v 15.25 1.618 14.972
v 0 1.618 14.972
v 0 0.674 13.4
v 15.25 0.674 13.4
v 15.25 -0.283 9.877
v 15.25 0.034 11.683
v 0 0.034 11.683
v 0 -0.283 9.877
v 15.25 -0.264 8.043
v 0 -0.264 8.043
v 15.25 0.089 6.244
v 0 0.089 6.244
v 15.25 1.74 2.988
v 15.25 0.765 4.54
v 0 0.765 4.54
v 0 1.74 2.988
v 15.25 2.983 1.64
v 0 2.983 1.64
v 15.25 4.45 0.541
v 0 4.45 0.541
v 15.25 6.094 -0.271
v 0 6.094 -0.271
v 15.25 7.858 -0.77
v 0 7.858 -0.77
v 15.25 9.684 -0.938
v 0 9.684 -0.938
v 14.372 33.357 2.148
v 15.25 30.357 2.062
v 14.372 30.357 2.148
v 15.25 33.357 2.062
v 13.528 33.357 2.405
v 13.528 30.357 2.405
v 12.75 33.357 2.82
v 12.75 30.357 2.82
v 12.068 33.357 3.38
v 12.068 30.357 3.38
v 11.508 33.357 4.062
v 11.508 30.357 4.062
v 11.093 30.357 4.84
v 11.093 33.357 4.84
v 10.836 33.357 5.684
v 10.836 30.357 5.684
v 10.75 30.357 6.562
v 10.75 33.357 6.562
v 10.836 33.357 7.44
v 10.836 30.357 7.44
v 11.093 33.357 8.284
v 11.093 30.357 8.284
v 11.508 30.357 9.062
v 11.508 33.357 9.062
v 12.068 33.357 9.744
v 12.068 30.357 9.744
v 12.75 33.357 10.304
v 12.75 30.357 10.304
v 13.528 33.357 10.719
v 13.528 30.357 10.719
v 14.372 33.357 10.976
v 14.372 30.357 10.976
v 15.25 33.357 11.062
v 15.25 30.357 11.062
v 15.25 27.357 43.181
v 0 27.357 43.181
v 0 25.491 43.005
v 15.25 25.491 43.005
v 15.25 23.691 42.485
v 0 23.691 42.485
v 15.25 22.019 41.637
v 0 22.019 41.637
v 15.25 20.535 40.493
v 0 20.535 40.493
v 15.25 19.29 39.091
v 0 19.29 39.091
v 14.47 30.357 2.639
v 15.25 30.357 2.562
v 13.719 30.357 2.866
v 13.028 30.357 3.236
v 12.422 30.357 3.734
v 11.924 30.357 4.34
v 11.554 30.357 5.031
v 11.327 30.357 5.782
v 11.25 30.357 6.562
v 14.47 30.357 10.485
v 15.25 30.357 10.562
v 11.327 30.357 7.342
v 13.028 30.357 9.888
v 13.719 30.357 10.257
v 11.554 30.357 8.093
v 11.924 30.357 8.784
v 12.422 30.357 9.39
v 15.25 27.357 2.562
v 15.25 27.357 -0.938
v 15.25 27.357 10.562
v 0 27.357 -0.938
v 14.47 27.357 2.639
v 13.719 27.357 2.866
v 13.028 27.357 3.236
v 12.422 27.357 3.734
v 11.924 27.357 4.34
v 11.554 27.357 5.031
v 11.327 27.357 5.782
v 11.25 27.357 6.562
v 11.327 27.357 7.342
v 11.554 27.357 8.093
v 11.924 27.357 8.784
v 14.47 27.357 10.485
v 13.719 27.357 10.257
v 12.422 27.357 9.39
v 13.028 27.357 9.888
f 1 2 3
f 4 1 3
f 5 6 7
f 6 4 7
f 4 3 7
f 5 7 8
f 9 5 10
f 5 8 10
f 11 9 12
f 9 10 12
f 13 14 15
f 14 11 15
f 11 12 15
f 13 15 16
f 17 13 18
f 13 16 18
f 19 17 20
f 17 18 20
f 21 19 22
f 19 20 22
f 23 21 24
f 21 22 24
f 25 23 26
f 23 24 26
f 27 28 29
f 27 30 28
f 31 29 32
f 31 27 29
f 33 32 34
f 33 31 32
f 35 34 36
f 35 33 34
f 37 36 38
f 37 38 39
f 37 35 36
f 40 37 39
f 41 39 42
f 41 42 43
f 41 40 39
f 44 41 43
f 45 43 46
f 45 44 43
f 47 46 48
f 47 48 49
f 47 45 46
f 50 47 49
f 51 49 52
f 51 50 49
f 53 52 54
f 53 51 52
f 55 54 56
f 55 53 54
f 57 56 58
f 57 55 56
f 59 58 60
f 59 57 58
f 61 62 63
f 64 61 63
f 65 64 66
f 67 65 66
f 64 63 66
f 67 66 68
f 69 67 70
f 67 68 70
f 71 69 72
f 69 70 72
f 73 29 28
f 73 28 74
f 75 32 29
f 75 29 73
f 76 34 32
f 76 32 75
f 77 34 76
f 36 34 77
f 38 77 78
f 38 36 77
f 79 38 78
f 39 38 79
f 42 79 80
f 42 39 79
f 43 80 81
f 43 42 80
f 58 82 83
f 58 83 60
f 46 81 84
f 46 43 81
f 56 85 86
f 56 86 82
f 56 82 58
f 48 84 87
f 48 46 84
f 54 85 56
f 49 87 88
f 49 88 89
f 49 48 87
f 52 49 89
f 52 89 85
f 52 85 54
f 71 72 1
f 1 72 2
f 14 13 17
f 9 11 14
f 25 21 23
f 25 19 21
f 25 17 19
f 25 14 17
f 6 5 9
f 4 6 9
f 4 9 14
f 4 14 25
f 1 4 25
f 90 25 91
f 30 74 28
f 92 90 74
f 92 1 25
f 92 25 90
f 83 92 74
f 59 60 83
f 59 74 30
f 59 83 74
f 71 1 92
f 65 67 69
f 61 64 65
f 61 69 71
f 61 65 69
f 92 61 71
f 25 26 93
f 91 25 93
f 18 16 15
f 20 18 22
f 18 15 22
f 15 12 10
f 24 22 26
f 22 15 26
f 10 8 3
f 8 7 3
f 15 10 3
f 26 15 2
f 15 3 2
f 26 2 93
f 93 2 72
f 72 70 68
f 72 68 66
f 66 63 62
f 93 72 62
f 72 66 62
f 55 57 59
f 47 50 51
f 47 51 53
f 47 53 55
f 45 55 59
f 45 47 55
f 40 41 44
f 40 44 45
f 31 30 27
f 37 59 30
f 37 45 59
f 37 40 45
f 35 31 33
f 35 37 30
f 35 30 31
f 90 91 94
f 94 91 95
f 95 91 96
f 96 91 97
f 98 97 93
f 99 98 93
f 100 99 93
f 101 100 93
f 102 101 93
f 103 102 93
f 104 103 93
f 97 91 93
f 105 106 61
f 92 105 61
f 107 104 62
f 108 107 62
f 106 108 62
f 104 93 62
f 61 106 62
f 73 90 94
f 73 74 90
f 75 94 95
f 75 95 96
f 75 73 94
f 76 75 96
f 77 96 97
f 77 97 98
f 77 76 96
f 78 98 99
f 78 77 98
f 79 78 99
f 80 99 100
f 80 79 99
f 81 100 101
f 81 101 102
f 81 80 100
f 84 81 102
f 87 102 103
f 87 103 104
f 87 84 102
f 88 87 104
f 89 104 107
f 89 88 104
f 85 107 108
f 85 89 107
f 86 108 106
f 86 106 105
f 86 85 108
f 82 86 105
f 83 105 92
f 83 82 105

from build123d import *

# Parameters (mm, degrees)
F1_DEPTH    = 15.25
F2_T1_DEPTH = 107.2974570989
F3_W        = 3
F3_H        = 4
F4_ANGLE    = 180


# Not quite as in the source:
# - a fillet or chamfer that OpenCascade refuses, or shapes differently, is made with other operations: its cross-section is extruded or revolved along the edge and cut away or added


with BuildPart() as f1:
    # F0 (on Right) → F1 (new body)
    with BuildSketch(Plane.YZ):
        with BuildLine():
            Line((27.3567325823, 33.1807983013), (27.3567325823, 43.1807983013))
            ThreePointArc((27.3567325823, 43.1807983013), (22.8348355324, 42.1000161521), (19.2903756049, 39.0912877154))
            Line((19.2903756049, 39.0912877154), (27.3567325823, 33.1807983013))
        make_face()
        with BuildLine():
            Line((27.3567325823, 23.1807983013), (27.3567325823, 33.1807983013))
            Line((27.3567325823, 33.1807983013), (21.4462431681, 25.1144413239))
            ThreePointArc((21.4462431681, 25.1144413239), (24.2473572248, 23.6764948083), (27.3567325823, 23.1807983013))
        make_face()
        with BuildLine():
            Line((21.4462431681, 25.1144413239), (27.3567325823, 33.1807983013))
            Line((27.3567325823, 33.1807983013), (19.2903756049, 39.0912877154))
            ThreePointArc((19.2903756049, 39.0912877154), (17.4736097193, 31.656369728), (21.4462431681, 25.1144413239))
        make_face()
        with BuildLine():
            ThreePointArc((21.4462431681, 25.1144413239), (17.4736097193, 31.656369728), (19.2903756049, 39.0912877154))
            Line((19.2903756049, 39.0912877154), (-5.7096243951, 4.9724677154))
            ThreePointArc((-5.7096243951, 4.9724677154), (0.832304009, 8.9451011642), (8.2672219964, 7.1283352786))
            Line((8.2672219964, 7.1283352786), (21.4462431681, 25.1144413239))
        make_face()
        with BuildLine():
            ThreePointArc((-5.7096243951, 4.9724677154), (-7.1475709107, 2.1713536587), (-7.6432674177, -0.9380216987))
            Line((-7.6432674177, -0.9380216987), (2.3567325823, -0.9380216987))
            Line((2.3567325823, -0.9380216987), (-5.7096243951, 4.9724677154))
        make_face()
        with BuildLine():
            Line((27.3567325823, -0.9380216987), (27.3567325823, 23.1807983013))
            ThreePointArc((27.3567325823, 23.1807983013), (24.2473572248, 23.6764948083), (21.4462431681, 25.1144413239))
            Line((21.4462431681, 25.1144413239), (8.2672219964, 7.1283352786))
            ThreePointArc((8.2672219964, 7.1283352786), (11.2759504331, 3.5838753511), (12.3567325823, -0.9380216987))
            Line((12.3567325823, -0.9380216987), (27.3567325823, -0.9380216987))
        make_face()
        with BuildLine():
            ThreePointArc((8.2672219964, 7.1283352786), (0.832304009, 8.9451011642), (-5.7096243951, 4.9724677154))
            Line((-5.7096243951, 4.9724677154), (2.3567325823, -0.9380216987))
            Line((2.3567325823, -0.9380216987), (8.2672219964, 7.1283352786))
        make_face()
        with BuildLine():
            Line((8.2672219964, 7.1283352786), (2.3567325823, -0.9380216987))
            Line((2.3567325823, -0.9380216987), (12.3567325823, -0.9380216987))
            ThreePointArc((12.3567325823, -0.9380216987), (11.2759504331, 3.5838753511), (8.2672219964, 7.1283352786))
        make_face()
    extrude(amount=F1_DEPTH)

    # F2: fillet of radius 10 on 1 edges, made by hand

    # F2_s2 → F2_t1 (cut)
    with BuildSketch(Plane.YZ.offset(-46.0237285495)):
        with BuildLine():
            ThreePointArc((1.6177099031, 14.9724677154), (0.7648490296, 4.5400812514), (9.6840668804, -0.9380216987))
            Line((9.6840668804, -0.9380216987), (9.6840668804, -1.9380216987))
            Line((9.6840668804, -1.9380216987), (-7.6432674177, -1.9380216987))
            Line((-7.6432674177, -1.9380216987), (-8.6432674177, -0.9380216987))
            ThreePointArc((-8.6432674177, -0.9380216987), (-6.5162600928, 5.5635166568), (0.8110742054, 15.5635166568))
            Line((0.8110742054, 15.5635166568), (1.6177099031, 14.9724677154))
        make_face()
    extrude(amount=F2_T1_DEPTH, mode=Mode.SUBTRACT)

    # F3 (on face) → F4 (revolve)
    with BuildSketch(Plane.YZ.offset(15.25)):
        with Locations((28.8567325823, 4.5619783013)):
            Rectangle(F3_W, F3_H)
        Polygon((33.3567325823, 6.5619783013), (30.3567325823, 6.5619783013), (30.3567325823, 2.5619783013), (30.3567325823, 2.0619783013), (33.3567325823, 2.0619783013), align=None)
    revolve(axis=Axis((15.25, 28.8567325823, 6.5619783013), (0, 1, 0)), revolution_arc=F4_ANGLE)


solid = f1.part
